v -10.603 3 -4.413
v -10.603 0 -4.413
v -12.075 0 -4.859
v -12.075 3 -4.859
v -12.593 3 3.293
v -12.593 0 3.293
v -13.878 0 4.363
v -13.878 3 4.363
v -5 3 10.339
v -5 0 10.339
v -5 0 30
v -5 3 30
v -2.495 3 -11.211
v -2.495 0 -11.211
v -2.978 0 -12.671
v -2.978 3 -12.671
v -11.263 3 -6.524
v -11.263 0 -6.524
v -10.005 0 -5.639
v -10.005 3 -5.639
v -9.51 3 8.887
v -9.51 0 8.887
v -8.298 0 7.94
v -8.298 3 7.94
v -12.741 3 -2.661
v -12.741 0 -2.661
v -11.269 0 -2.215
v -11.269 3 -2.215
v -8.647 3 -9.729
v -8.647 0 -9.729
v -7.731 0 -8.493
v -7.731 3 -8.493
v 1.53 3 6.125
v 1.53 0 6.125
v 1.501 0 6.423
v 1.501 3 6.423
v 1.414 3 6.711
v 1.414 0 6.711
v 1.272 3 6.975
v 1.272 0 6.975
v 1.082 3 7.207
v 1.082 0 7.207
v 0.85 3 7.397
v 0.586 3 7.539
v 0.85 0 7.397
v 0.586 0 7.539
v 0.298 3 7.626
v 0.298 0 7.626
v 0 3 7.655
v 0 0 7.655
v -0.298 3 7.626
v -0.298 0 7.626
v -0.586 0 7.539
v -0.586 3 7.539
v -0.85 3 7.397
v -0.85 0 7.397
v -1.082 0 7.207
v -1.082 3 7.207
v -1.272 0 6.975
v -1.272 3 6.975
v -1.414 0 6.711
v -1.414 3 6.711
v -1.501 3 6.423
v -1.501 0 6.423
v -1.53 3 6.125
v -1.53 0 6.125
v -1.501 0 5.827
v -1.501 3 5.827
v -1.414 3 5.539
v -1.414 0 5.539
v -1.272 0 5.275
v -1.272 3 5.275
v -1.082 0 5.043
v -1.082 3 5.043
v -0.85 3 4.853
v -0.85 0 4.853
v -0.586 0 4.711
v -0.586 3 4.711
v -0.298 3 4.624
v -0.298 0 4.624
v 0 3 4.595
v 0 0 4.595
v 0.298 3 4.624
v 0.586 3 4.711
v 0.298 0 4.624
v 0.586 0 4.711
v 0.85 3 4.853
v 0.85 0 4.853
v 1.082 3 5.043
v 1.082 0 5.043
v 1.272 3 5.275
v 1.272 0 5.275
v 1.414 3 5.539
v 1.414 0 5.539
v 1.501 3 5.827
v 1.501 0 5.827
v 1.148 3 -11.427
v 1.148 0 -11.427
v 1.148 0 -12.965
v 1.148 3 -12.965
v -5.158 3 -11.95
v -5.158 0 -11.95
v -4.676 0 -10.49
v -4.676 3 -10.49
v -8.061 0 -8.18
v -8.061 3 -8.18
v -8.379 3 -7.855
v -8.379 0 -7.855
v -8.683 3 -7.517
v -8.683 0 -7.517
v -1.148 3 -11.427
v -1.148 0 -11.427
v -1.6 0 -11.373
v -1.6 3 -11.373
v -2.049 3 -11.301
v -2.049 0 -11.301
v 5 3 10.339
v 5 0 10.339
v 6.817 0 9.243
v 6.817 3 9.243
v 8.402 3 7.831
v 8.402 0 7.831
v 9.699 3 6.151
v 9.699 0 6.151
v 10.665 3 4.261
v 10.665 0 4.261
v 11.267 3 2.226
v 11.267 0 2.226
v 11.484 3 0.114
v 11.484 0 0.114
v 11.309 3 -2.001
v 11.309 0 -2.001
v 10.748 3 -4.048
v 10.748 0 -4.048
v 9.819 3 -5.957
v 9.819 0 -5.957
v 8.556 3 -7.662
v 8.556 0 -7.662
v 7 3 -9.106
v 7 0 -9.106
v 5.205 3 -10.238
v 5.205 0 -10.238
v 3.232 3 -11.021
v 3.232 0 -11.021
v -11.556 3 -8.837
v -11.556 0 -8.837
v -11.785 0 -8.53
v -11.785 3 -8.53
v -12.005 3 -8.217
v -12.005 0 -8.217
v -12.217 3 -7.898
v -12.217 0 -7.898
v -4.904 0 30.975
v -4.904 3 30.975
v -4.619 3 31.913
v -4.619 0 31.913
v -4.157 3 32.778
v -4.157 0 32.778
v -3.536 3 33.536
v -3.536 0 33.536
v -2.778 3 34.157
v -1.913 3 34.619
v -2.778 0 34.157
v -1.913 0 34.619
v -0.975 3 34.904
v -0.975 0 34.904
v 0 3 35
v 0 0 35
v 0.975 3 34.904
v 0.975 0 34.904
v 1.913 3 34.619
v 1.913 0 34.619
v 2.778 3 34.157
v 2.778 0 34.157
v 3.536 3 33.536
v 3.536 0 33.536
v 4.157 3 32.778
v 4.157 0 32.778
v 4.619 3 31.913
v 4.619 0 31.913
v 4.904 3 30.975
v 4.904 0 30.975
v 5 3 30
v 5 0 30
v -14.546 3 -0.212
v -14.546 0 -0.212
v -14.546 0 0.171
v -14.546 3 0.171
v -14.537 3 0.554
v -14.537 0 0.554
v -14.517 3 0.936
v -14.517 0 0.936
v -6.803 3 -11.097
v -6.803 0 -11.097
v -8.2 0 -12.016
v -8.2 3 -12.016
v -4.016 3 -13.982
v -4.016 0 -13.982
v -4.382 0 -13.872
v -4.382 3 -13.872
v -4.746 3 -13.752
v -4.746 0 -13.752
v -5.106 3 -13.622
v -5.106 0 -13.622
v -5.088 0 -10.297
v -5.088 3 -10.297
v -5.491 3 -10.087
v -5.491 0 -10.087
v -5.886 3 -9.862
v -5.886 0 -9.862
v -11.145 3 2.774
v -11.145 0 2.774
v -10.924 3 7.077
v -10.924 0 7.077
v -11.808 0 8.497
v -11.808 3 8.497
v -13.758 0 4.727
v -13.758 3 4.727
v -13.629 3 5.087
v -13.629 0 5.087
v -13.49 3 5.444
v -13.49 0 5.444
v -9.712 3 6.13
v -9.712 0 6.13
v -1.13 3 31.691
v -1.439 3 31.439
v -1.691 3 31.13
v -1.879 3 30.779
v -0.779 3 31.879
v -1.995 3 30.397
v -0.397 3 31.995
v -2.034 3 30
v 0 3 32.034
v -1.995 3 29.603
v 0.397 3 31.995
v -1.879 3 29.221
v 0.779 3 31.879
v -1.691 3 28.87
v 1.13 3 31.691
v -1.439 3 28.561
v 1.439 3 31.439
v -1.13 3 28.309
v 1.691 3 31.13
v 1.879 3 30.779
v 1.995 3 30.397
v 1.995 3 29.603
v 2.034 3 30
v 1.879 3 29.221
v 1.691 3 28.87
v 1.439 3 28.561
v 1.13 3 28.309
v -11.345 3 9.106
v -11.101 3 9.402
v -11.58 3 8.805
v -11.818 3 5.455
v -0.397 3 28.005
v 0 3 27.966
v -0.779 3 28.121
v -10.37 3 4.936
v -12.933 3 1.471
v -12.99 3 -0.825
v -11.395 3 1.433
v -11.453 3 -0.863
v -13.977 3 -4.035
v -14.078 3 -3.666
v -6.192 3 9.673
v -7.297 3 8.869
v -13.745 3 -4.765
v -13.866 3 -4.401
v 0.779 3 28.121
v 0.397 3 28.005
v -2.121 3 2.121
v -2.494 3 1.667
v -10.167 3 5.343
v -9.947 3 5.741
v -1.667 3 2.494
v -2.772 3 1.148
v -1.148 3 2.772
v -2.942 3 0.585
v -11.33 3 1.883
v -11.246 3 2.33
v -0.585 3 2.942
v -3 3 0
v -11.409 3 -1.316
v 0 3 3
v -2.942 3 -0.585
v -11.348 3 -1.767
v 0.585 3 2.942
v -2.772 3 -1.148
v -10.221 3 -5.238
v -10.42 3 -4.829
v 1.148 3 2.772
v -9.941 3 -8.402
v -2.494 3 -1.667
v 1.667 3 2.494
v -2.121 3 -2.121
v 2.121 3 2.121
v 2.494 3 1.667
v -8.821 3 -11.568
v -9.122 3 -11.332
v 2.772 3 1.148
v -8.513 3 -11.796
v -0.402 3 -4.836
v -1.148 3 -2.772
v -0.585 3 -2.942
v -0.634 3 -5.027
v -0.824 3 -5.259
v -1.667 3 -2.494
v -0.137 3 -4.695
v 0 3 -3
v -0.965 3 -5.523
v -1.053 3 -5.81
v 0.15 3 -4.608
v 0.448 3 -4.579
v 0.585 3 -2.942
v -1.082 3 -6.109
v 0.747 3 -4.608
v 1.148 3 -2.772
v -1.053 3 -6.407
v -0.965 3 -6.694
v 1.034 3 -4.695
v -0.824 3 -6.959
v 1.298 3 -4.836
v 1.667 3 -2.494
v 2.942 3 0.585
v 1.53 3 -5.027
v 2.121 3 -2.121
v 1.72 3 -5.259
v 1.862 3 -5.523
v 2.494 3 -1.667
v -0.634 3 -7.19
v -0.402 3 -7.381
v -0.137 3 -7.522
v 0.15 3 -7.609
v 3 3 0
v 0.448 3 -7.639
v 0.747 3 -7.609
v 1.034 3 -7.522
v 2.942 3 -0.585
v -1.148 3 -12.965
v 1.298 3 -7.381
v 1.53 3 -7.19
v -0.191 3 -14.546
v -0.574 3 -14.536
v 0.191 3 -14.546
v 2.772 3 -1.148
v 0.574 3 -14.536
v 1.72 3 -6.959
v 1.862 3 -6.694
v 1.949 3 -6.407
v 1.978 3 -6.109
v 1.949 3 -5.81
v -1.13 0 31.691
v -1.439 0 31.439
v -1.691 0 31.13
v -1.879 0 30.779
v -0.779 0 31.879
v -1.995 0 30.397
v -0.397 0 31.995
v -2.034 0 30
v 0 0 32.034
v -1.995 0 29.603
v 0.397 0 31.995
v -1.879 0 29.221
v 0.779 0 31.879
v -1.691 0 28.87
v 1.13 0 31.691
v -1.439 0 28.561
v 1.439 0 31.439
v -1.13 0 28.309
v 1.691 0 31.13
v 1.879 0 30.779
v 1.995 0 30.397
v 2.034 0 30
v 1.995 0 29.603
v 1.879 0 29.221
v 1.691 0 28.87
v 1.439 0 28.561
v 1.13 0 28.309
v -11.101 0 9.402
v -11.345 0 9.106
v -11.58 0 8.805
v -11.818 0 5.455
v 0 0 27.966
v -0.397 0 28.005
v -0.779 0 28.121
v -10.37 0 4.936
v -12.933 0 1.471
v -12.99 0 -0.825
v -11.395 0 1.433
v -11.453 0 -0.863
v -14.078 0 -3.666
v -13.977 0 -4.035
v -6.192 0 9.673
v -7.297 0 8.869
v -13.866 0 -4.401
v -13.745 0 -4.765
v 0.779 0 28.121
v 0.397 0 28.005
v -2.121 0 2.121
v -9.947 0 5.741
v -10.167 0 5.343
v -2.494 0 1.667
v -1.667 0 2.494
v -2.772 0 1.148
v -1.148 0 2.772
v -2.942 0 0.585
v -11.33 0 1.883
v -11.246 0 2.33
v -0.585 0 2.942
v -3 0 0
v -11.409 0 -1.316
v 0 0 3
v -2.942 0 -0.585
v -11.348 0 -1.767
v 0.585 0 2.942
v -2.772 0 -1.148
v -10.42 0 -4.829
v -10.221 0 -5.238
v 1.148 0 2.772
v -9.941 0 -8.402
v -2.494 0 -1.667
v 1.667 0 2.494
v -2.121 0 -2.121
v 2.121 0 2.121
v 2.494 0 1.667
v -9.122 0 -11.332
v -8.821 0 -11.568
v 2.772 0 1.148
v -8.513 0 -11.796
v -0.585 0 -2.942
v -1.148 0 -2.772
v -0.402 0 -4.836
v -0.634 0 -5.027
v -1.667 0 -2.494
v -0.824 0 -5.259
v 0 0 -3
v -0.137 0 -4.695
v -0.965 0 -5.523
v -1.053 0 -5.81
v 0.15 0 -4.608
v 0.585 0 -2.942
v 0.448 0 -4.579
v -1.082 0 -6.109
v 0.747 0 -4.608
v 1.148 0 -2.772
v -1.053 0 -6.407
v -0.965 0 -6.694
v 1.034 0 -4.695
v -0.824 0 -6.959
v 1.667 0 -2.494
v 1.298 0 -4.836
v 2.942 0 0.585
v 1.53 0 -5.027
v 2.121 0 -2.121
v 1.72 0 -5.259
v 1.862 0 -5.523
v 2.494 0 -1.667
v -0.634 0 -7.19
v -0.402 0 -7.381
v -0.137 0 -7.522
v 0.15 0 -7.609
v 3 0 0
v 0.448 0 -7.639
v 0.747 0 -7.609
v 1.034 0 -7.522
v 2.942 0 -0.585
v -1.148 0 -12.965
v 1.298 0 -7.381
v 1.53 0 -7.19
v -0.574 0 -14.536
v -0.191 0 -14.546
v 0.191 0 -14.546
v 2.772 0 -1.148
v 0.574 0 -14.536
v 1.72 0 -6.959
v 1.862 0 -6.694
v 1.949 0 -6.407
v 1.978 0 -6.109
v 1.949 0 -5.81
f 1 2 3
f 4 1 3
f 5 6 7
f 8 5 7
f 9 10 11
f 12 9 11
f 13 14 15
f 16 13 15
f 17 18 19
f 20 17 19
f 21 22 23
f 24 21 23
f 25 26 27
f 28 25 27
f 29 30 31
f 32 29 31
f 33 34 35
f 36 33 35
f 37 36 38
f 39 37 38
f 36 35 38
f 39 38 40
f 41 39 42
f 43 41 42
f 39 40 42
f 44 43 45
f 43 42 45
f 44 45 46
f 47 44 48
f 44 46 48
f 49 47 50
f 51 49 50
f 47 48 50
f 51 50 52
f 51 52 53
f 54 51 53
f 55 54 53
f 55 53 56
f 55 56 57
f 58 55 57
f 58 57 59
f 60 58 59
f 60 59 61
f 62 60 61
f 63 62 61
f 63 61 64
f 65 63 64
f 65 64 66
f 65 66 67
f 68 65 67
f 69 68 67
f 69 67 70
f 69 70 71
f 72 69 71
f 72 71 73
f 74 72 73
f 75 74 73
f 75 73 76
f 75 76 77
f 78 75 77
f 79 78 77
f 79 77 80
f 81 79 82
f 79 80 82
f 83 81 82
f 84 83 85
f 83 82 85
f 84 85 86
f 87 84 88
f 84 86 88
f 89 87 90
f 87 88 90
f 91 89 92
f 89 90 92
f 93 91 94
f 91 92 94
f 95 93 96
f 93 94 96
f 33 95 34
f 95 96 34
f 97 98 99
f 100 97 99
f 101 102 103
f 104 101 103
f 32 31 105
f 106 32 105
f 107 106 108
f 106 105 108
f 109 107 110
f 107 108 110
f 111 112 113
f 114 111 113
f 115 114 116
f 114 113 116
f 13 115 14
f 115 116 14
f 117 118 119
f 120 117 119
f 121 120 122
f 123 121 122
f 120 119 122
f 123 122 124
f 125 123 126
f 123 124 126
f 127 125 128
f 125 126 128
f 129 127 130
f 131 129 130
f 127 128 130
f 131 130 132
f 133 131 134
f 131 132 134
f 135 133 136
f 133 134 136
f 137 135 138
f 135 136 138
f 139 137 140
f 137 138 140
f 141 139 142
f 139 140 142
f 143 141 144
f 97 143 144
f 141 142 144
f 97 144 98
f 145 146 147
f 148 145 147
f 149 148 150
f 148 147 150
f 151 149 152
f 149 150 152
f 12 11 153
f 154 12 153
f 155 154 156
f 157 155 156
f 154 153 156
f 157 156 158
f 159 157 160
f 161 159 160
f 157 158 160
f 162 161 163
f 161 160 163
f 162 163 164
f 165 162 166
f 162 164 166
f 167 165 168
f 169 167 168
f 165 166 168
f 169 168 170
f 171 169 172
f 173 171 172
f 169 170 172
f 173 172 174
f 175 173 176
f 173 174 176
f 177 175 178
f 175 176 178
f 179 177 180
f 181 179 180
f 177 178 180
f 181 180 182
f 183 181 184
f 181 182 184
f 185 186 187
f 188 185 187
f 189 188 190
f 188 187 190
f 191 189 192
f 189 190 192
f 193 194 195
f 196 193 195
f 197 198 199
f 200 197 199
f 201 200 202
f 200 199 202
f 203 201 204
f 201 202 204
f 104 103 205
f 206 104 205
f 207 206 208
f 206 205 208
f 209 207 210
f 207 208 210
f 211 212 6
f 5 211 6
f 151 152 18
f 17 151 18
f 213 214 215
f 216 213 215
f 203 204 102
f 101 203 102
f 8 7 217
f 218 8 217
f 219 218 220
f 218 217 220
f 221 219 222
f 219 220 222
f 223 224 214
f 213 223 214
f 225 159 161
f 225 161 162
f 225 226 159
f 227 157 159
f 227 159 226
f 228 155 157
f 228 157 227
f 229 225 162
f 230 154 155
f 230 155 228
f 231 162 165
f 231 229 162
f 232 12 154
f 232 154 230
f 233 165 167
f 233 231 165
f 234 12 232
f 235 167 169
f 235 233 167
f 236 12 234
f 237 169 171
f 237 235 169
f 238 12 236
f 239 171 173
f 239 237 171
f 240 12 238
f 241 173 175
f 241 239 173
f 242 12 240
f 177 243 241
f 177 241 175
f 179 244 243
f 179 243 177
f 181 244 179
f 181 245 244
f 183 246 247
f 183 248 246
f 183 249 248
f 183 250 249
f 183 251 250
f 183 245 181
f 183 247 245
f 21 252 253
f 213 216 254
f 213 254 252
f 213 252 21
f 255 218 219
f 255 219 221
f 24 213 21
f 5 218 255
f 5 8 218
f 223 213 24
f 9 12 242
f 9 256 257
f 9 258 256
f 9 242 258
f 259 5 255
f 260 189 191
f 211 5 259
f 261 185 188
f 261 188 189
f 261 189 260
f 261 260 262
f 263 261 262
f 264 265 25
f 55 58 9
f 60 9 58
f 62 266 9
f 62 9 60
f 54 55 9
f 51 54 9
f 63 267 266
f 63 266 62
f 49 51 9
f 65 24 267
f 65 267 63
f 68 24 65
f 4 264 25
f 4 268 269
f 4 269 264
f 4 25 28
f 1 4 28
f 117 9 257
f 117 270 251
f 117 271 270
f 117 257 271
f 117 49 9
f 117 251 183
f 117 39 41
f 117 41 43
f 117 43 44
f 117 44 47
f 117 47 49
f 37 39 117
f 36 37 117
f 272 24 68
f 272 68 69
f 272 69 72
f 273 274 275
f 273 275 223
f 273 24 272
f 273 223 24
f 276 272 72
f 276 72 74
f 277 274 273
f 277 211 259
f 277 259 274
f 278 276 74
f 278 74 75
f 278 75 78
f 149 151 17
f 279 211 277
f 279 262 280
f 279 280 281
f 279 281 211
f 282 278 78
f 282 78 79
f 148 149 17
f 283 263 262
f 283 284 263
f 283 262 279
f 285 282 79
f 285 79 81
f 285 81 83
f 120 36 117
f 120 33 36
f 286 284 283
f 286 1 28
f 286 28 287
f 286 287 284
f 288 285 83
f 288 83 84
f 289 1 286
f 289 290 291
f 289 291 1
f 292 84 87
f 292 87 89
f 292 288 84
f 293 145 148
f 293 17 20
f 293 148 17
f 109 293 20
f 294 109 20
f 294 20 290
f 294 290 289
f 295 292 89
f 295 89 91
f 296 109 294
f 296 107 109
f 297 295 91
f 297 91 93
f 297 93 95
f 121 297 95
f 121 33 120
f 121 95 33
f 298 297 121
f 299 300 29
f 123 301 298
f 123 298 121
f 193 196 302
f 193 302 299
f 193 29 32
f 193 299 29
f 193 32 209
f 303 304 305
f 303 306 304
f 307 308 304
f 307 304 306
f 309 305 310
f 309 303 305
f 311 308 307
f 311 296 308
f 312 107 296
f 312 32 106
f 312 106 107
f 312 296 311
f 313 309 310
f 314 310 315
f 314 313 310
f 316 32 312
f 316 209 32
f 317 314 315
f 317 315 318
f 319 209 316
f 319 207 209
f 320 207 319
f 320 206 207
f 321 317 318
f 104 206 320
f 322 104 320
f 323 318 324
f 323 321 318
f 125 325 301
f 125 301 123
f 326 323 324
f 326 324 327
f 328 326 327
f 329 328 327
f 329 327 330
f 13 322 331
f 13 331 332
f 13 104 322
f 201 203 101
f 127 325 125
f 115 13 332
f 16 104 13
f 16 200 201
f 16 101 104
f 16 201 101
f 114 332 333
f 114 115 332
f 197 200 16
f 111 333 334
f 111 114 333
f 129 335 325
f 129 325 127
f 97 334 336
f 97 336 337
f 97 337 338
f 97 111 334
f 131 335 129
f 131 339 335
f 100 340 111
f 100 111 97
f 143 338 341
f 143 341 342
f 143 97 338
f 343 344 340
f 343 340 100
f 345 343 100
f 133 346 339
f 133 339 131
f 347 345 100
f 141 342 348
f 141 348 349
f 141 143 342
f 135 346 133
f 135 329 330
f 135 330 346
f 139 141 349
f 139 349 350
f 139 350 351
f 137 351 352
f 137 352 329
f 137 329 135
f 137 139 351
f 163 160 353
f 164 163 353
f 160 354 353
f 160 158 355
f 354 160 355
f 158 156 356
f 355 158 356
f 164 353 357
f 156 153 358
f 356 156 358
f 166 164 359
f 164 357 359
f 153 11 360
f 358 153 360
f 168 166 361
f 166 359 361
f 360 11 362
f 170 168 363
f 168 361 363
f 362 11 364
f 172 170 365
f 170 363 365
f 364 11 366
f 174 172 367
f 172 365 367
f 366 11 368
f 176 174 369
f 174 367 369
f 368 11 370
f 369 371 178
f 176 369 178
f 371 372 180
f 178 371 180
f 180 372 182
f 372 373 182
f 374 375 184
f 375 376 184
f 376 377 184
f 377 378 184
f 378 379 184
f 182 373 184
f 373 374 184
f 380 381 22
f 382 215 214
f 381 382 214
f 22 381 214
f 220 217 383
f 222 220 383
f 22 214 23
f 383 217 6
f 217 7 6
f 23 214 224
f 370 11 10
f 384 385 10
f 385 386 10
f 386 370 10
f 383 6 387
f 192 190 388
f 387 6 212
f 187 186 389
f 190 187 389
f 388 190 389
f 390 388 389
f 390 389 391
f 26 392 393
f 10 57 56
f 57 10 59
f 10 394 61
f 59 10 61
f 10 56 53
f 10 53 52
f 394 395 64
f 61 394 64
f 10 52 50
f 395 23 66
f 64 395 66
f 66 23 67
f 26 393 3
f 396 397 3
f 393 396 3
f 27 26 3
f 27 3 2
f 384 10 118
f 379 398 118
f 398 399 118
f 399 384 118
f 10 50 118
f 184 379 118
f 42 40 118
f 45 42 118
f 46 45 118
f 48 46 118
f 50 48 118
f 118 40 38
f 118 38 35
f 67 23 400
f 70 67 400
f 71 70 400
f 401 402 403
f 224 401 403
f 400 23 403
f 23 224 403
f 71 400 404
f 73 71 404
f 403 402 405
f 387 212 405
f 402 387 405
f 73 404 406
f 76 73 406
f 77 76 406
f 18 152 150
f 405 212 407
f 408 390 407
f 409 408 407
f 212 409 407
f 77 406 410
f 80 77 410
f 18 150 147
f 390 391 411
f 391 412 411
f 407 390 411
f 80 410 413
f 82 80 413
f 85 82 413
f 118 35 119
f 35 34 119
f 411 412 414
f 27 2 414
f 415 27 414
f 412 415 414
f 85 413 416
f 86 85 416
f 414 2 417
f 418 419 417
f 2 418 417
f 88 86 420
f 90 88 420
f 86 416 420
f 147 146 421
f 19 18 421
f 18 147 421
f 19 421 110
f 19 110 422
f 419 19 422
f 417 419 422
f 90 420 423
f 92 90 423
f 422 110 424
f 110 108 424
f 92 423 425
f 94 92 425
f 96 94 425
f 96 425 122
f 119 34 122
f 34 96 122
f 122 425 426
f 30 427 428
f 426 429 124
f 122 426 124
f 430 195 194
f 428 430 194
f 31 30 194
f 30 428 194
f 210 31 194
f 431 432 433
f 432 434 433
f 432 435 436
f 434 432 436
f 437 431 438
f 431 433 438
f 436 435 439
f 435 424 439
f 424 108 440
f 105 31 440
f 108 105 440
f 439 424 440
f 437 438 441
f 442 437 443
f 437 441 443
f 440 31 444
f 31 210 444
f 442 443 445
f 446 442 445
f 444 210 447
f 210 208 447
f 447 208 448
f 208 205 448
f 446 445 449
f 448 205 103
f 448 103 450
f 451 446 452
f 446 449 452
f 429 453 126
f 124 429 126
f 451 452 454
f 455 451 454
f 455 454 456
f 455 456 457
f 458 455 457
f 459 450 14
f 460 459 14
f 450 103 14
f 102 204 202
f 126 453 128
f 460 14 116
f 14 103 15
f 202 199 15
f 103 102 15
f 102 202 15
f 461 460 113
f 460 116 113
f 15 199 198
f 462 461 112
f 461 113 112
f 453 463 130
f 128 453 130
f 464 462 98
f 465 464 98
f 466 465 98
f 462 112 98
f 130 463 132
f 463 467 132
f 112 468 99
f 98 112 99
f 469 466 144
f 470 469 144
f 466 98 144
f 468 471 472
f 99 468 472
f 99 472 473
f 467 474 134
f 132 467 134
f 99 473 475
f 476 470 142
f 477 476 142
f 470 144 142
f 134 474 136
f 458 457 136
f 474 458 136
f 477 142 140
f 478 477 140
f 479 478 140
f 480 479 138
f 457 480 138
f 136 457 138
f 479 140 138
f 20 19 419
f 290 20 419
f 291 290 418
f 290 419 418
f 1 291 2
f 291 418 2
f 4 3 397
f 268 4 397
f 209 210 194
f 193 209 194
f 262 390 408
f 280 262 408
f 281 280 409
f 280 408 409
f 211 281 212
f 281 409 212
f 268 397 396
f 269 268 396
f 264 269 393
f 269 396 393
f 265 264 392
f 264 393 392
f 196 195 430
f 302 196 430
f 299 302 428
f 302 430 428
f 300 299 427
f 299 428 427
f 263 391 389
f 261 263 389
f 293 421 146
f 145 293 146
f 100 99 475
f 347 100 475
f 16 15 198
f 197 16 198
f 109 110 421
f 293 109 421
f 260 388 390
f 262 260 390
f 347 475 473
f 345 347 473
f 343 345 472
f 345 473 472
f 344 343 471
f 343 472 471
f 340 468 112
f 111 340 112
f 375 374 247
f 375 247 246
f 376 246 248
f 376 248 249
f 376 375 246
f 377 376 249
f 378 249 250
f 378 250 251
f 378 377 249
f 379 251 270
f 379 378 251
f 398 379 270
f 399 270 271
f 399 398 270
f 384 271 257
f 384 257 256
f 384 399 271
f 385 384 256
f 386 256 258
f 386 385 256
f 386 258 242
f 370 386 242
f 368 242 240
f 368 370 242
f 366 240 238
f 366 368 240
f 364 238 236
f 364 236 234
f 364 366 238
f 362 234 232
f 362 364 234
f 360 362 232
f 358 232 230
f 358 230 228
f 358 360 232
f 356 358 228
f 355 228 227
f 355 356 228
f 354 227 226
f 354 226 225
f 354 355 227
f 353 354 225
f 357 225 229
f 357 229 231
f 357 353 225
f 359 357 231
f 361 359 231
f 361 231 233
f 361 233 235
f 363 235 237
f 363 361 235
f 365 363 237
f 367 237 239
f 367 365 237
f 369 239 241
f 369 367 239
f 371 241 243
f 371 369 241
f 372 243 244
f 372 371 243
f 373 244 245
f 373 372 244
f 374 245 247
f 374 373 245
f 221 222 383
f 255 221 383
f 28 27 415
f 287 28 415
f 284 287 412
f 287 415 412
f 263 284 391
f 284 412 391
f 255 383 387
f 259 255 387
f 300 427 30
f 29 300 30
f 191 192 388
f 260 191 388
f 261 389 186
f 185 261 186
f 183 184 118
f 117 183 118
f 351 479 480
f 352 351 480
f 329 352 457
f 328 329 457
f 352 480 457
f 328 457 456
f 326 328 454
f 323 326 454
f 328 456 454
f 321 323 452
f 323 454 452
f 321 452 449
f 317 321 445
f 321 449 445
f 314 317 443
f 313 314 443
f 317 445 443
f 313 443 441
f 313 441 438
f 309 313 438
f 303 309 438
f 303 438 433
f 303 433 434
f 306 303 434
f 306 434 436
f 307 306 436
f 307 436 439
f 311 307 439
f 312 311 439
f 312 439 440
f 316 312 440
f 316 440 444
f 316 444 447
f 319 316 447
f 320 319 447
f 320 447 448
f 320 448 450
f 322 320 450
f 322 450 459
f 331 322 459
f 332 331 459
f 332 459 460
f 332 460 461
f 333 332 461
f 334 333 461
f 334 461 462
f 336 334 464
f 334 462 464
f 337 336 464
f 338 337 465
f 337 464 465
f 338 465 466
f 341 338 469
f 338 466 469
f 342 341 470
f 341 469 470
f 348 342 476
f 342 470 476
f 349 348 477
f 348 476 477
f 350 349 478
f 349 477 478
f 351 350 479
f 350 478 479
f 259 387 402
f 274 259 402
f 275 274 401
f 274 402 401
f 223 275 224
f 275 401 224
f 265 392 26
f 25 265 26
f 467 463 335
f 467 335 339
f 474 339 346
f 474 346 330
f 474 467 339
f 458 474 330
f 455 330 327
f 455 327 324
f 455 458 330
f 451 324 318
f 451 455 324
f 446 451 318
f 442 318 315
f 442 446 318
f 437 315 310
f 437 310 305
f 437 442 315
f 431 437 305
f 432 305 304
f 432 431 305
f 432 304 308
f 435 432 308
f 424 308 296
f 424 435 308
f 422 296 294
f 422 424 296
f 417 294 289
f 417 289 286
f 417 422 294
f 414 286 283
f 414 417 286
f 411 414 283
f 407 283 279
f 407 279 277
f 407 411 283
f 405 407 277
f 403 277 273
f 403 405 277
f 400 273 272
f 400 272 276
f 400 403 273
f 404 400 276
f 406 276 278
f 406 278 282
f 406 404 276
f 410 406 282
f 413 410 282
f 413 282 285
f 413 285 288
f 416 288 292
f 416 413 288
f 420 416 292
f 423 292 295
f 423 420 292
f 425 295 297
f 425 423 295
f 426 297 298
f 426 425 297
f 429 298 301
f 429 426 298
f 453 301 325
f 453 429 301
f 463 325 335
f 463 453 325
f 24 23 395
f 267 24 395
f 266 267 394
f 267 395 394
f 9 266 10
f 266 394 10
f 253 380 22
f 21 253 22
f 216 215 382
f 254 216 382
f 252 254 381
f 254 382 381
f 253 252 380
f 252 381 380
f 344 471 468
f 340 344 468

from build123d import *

# Parameters (mm, degrees)
CROQUIS1_R              = 2.034348523
CROQUIS1_R_2            = 3
SALIENTE_EXTRUIR1_DEPTH = 3
SALIENTE_EXTRUIR2_DEPTH = 3
MATRIZC1_COUNT          = 8
MATRIZC1_ANGLE          = 128
CROQUIS4_R              = 1.53
CORTAR_EXTRUIR1_DEPTH   = 10


with BuildPart() as part:
    # Croquis1 → Saliente-Extruir1 (new body)
    with BuildSketch(Plane(origin=(0, 0, 0), x_dir=(1, 0, 0), z_dir=(0, 1, 0))):
        with BuildLine():
            Line((-5, -10.339498295), (-5, -30))
            ThreePointArc((-5, -30), (0, -35), (5, -30))
            Line((5, -30), (5, -10.339498295))
            ThreePointArc((5, -10.339498295), (0, 11.485), (-5, -10.339498295))
        make_face()
        with Locations((0, -30)):
            Circle(CROQUIS1_R, mode=Mode.SUBTRACT)
        Circle(CROQUIS1_R_2, mode=Mode.SUBTRACT)
    extrude(amount=SALIENTE_EXTRUIR1_DEPTH)

    # Croquis3 → Saliente-Extruir2 (add)
    with BuildSketch(Plane(origin=(0, 0, 0), x_dir=(1, 0, 0), z_dir=(0, 1, 0))):
        with BuildLine():
            Line((-1.1484375, 12.965487086), (-1.1484375, 11.427436996))
            ThreePointArc((-1.1484375, 11.427436996), (0, 11.485), (1.1484375, 11.427436996))
            Line((1.1484375, 11.427436996), (1.1484375, 12.965487086))
            Line((1.1484375, 12.965487086), (0.57421875, 14.536162804))
            ThreePointArc((0.57421875, 14.536162804), (0, 14.5475), (-0.57421875, 14.536162804))
            Line((-0.57421875, 14.536162804), (-1.1484375, 12.965487086))
        make_face()
    saliente_extruir2 = extrude(amount=SALIENTE_EXTRUIR2_DEPTH)

    # MatrizC1: Saliente-Extruir2 ×8 about axis
    matrizc1_axis = Axis((0, 0, 0), (0, 1, 0))
    for i in range(1, MATRIZC1_COUNT):
        add(saliente_extruir2.rotate(matrizc1_axis, i * MATRIZC1_ANGLE / (MATRIZC1_COUNT - 1)))

    # Croquis4 → Cortar-Extruir1 (cut)
    with BuildSketch(Plane.XZ):
        with Locations((0.448059245, -6.108589683)):
            Circle(CROQUIS4_R)
        with Locations((0, 6.125)):
            Circle(CROQUIS4_R)
    extrude(amount=-CORTAR_EXTRUIR1_DEPTH, mode=Mode.SUBTRACT)


solid = part.part
